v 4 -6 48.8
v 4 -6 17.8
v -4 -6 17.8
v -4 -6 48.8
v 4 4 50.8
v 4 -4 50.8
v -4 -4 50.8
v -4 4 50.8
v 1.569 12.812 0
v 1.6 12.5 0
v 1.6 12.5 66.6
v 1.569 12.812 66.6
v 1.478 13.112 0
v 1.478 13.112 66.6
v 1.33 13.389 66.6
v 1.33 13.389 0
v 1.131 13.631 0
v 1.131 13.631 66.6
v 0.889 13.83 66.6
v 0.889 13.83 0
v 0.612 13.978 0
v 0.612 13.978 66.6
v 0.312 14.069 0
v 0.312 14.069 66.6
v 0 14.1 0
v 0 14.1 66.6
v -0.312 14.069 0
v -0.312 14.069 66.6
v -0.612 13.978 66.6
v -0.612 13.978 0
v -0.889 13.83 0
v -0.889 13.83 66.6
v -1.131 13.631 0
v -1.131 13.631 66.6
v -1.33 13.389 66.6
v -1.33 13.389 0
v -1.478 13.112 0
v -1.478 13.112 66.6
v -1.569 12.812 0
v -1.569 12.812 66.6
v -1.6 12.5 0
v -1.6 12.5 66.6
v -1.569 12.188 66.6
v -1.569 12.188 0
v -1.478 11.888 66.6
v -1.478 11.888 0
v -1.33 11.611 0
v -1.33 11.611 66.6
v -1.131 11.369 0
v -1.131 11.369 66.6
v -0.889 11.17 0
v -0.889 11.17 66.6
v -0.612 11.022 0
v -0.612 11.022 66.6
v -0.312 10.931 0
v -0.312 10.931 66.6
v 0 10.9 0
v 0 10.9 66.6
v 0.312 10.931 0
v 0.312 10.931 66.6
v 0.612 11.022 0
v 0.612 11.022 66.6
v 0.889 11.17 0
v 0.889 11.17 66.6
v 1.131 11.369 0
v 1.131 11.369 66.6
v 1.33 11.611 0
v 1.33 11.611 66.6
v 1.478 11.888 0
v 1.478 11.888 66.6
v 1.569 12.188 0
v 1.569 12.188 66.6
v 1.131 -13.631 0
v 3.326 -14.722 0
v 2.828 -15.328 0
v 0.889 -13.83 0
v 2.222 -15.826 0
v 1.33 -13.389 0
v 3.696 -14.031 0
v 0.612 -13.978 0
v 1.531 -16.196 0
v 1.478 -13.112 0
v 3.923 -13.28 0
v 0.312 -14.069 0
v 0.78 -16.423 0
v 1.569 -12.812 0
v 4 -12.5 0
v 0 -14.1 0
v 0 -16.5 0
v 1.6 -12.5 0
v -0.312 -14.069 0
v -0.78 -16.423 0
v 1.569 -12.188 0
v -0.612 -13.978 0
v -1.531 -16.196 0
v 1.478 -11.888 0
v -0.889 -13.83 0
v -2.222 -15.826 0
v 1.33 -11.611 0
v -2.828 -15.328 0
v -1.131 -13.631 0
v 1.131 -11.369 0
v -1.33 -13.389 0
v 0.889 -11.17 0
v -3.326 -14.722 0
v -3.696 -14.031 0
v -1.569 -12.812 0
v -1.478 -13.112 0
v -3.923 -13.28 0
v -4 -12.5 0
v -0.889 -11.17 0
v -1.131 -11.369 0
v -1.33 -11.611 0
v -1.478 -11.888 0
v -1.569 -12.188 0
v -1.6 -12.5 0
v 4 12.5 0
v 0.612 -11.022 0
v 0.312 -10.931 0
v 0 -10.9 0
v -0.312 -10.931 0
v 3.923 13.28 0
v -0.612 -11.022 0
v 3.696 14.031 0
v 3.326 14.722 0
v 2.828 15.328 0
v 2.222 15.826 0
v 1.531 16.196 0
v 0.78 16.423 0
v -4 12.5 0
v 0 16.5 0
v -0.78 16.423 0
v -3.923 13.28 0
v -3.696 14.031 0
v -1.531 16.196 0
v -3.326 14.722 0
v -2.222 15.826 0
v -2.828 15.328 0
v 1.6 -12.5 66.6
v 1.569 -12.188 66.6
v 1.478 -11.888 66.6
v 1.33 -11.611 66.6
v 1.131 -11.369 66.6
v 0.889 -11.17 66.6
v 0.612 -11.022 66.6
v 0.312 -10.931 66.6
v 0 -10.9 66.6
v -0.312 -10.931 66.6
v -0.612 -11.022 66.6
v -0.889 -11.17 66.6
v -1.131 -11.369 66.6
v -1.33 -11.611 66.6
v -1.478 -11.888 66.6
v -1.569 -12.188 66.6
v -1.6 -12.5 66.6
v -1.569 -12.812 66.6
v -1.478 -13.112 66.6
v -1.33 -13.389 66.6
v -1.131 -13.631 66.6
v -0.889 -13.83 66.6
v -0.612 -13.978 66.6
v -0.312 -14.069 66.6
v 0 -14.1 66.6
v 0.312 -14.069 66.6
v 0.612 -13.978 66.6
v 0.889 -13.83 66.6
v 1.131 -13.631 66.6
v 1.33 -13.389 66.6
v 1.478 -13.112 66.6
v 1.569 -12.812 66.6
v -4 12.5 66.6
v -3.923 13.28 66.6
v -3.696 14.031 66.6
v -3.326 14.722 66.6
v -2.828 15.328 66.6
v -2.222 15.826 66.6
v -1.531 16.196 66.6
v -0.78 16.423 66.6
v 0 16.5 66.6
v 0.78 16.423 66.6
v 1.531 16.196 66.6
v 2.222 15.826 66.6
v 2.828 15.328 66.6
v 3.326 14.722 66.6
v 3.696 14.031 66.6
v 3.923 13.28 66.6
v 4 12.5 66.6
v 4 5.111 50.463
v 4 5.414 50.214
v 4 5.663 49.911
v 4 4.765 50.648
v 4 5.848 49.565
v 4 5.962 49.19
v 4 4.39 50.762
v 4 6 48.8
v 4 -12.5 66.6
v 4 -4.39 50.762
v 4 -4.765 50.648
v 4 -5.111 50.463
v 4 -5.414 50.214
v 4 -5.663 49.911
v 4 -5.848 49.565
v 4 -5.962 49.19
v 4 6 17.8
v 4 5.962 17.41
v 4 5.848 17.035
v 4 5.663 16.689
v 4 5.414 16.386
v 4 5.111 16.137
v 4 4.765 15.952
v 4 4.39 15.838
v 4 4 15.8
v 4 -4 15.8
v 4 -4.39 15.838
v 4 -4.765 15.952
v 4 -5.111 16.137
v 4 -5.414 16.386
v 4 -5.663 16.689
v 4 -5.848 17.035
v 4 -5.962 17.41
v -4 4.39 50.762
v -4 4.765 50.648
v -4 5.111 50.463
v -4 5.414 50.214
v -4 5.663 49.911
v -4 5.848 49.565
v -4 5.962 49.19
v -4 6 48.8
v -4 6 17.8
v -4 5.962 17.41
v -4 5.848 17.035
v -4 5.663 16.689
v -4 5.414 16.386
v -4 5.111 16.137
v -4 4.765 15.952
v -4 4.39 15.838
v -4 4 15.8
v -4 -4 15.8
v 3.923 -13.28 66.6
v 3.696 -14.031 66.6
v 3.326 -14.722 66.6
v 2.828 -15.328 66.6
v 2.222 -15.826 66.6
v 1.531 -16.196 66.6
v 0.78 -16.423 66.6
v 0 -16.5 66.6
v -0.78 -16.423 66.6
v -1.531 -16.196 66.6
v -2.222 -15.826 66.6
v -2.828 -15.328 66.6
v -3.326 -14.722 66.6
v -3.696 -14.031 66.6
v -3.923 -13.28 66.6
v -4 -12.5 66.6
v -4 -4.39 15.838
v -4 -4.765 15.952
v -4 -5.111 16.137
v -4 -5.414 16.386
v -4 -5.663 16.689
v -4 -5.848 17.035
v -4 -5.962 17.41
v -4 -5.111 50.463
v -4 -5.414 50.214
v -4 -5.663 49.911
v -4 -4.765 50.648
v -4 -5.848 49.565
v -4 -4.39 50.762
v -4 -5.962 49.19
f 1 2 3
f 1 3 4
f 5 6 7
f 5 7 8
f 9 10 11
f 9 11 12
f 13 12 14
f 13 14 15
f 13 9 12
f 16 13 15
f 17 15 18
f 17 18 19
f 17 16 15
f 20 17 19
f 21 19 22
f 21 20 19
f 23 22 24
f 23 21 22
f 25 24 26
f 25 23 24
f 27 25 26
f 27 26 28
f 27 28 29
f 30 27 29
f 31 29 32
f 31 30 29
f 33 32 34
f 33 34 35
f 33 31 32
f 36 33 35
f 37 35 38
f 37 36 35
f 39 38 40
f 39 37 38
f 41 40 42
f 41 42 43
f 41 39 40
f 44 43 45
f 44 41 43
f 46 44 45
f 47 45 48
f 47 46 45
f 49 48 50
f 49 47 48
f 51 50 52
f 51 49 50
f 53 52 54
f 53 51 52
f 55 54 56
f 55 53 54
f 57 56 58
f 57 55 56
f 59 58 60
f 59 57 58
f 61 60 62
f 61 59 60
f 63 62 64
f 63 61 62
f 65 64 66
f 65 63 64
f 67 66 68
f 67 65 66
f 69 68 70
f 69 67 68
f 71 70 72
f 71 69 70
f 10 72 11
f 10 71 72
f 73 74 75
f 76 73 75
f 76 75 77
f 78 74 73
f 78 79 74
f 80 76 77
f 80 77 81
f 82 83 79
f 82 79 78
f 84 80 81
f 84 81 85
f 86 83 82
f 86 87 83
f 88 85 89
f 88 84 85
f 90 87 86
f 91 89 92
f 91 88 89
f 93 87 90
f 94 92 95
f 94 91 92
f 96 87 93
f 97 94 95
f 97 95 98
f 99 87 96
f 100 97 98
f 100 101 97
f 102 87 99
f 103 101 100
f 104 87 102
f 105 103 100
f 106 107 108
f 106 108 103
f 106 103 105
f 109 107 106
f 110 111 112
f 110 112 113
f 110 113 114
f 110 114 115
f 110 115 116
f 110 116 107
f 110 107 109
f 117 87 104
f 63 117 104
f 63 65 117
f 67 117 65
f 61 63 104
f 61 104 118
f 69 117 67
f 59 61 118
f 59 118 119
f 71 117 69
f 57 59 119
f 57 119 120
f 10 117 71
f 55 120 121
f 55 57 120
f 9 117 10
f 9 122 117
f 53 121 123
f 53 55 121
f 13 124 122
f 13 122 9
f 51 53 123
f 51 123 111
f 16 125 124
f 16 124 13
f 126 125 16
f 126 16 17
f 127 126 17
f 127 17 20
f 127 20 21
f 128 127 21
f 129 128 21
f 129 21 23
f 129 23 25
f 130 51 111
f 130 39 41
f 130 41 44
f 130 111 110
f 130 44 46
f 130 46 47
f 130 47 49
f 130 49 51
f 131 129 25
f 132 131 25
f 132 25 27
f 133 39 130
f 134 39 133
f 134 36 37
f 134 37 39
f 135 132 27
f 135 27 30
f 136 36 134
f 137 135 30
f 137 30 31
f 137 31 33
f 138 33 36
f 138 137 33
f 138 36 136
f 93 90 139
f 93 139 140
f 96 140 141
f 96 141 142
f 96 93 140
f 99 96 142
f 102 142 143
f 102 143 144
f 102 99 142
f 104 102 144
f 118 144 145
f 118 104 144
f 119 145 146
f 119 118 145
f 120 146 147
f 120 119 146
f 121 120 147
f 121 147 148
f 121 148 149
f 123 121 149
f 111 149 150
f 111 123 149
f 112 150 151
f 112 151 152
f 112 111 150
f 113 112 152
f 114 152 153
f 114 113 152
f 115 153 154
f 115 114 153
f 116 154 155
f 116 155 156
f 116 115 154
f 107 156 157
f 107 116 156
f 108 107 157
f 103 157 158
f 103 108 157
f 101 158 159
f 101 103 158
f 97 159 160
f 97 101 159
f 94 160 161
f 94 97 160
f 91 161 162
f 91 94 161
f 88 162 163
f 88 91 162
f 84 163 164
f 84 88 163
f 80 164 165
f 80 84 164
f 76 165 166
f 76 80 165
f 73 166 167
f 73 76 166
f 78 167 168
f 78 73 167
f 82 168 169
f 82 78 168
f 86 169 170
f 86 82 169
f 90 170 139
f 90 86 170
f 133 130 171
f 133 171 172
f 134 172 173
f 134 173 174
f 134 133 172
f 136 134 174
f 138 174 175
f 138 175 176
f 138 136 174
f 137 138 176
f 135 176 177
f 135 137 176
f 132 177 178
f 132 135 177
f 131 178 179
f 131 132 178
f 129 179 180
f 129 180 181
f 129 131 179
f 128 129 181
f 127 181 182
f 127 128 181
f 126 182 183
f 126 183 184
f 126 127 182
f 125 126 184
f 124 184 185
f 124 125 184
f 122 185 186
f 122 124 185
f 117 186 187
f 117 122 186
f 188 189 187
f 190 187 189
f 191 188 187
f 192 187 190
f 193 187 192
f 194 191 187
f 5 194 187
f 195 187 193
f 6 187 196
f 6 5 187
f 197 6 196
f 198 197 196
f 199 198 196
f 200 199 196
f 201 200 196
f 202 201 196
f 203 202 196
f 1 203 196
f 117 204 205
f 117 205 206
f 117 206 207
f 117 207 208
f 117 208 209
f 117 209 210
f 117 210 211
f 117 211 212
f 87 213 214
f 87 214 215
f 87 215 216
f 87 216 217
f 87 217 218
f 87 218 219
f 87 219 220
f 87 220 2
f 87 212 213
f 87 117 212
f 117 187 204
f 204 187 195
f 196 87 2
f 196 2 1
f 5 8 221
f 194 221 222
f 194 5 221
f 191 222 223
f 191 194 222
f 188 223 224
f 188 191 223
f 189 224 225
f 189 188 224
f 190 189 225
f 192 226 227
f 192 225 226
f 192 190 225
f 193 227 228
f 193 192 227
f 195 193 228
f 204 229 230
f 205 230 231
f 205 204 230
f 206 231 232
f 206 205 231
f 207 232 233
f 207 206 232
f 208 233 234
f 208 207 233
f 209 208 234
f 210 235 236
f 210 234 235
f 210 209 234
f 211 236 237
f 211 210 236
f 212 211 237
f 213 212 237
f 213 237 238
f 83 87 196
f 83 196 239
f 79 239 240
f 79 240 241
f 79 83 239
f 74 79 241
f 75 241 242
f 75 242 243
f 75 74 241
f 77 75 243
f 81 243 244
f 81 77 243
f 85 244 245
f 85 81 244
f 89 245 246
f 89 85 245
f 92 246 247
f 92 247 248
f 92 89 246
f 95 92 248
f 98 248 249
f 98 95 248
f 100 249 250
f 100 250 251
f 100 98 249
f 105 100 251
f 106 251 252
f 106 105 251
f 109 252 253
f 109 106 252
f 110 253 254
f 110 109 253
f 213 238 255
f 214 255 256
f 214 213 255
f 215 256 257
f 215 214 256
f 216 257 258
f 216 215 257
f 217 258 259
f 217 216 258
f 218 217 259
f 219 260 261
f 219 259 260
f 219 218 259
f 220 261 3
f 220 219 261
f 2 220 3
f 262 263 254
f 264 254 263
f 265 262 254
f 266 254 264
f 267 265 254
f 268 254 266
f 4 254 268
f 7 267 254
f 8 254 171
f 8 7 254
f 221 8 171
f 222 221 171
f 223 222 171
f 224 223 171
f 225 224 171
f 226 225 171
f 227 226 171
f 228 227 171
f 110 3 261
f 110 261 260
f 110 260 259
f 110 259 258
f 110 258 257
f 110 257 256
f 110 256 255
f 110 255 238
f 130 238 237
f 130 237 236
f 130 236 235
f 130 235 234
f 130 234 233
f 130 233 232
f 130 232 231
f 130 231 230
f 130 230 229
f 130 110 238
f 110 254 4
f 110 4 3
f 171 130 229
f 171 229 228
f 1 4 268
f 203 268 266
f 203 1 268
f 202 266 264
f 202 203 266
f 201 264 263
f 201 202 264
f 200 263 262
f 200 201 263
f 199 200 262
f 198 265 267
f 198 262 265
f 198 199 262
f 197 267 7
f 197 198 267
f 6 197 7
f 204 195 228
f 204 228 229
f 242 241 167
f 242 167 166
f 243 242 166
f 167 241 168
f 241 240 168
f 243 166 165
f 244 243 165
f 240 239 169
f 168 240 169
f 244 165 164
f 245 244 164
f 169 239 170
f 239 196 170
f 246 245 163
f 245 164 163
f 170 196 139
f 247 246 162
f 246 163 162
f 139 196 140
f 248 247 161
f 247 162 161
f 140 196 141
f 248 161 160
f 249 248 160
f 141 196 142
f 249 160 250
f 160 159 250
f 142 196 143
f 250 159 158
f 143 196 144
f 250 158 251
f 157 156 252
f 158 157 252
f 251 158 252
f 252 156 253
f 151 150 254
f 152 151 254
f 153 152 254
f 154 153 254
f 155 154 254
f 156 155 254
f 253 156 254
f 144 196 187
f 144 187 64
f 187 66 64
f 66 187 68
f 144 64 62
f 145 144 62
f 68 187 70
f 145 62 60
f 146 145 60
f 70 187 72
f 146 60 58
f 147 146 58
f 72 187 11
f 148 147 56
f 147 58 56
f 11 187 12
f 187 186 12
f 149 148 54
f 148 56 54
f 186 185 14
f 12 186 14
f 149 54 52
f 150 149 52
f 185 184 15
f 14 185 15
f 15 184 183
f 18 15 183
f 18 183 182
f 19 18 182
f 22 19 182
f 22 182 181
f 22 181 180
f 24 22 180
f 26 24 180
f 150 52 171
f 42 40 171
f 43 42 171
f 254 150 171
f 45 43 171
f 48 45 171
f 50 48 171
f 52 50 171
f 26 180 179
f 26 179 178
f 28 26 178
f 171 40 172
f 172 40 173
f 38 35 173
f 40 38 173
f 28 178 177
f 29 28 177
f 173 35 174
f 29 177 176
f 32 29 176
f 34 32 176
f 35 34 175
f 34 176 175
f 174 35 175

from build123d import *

# Parameters (mm, degrees)
SKETCH_1_R          = 1.6
EXTRUDE_1_DEPTH     = 66.6
CUT_EXTRUDE_1_DEPTH = 70.078288919


with BuildPart() as part:
    # 草图1 → 凸台-拉伸1 (new body)
    with BuildSketch(Plane.XY):
        with BuildLine():
            Line((-4, -12.5), (-4, 12.5))
            ThreePointArc((-4, 12.5), (0, 16.5), (4, 12.5))
            Line((4, 12.5), (4, -12.5))
            ThreePointArc((4, -12.5), (0, -16.5), (-4, -12.5))
        make_face()
        with Locations((0, 12.5)):
            Circle(SKETCH_1_R, mode=Mode.SUBTRACT)
        with Locations((0, -12.5)):
            Circle(SKETCH_1_R, mode=Mode.SUBTRACT)
    extrude(amount=EXTRUDE_1_DEPTH)

    # 草图2 → 切除-拉伸1 (cut, through all)
    with BuildSketch(Plane(origin=(4, 0, 0), x_dir=(0, 0, -1), z_dir=(1, 0, 0))):
        with BuildLine():
            Line((-17.8, -6), (-48.8, -6))
            ThreePointArc((-48.8, -6), (-50.214213562, -5.414213562), (-50.8, -4))
            Line((-50.8, -4), (-50.8, 4))
            ThreePointArc((-50.8, 4), (-50.214213562, 5.414213562), (-48.8, 6))
            Line((-48.8, 6), (-17.8, 6))
            ThreePointArc((-17.8, 6), (-16.385786438, 5.414213562), (-15.8, 4))
            Line((-15.8, 4), (-15.8, -4))
            ThreePointArc((-15.8, -4), (-16.385786438, -5.414213562), (-17.8, -6))
        make_face()
    extrude(amount=-CUT_EXTRUDE_1_DEPTH, mode=Mode.SUBTRACT)


solid = part.part
